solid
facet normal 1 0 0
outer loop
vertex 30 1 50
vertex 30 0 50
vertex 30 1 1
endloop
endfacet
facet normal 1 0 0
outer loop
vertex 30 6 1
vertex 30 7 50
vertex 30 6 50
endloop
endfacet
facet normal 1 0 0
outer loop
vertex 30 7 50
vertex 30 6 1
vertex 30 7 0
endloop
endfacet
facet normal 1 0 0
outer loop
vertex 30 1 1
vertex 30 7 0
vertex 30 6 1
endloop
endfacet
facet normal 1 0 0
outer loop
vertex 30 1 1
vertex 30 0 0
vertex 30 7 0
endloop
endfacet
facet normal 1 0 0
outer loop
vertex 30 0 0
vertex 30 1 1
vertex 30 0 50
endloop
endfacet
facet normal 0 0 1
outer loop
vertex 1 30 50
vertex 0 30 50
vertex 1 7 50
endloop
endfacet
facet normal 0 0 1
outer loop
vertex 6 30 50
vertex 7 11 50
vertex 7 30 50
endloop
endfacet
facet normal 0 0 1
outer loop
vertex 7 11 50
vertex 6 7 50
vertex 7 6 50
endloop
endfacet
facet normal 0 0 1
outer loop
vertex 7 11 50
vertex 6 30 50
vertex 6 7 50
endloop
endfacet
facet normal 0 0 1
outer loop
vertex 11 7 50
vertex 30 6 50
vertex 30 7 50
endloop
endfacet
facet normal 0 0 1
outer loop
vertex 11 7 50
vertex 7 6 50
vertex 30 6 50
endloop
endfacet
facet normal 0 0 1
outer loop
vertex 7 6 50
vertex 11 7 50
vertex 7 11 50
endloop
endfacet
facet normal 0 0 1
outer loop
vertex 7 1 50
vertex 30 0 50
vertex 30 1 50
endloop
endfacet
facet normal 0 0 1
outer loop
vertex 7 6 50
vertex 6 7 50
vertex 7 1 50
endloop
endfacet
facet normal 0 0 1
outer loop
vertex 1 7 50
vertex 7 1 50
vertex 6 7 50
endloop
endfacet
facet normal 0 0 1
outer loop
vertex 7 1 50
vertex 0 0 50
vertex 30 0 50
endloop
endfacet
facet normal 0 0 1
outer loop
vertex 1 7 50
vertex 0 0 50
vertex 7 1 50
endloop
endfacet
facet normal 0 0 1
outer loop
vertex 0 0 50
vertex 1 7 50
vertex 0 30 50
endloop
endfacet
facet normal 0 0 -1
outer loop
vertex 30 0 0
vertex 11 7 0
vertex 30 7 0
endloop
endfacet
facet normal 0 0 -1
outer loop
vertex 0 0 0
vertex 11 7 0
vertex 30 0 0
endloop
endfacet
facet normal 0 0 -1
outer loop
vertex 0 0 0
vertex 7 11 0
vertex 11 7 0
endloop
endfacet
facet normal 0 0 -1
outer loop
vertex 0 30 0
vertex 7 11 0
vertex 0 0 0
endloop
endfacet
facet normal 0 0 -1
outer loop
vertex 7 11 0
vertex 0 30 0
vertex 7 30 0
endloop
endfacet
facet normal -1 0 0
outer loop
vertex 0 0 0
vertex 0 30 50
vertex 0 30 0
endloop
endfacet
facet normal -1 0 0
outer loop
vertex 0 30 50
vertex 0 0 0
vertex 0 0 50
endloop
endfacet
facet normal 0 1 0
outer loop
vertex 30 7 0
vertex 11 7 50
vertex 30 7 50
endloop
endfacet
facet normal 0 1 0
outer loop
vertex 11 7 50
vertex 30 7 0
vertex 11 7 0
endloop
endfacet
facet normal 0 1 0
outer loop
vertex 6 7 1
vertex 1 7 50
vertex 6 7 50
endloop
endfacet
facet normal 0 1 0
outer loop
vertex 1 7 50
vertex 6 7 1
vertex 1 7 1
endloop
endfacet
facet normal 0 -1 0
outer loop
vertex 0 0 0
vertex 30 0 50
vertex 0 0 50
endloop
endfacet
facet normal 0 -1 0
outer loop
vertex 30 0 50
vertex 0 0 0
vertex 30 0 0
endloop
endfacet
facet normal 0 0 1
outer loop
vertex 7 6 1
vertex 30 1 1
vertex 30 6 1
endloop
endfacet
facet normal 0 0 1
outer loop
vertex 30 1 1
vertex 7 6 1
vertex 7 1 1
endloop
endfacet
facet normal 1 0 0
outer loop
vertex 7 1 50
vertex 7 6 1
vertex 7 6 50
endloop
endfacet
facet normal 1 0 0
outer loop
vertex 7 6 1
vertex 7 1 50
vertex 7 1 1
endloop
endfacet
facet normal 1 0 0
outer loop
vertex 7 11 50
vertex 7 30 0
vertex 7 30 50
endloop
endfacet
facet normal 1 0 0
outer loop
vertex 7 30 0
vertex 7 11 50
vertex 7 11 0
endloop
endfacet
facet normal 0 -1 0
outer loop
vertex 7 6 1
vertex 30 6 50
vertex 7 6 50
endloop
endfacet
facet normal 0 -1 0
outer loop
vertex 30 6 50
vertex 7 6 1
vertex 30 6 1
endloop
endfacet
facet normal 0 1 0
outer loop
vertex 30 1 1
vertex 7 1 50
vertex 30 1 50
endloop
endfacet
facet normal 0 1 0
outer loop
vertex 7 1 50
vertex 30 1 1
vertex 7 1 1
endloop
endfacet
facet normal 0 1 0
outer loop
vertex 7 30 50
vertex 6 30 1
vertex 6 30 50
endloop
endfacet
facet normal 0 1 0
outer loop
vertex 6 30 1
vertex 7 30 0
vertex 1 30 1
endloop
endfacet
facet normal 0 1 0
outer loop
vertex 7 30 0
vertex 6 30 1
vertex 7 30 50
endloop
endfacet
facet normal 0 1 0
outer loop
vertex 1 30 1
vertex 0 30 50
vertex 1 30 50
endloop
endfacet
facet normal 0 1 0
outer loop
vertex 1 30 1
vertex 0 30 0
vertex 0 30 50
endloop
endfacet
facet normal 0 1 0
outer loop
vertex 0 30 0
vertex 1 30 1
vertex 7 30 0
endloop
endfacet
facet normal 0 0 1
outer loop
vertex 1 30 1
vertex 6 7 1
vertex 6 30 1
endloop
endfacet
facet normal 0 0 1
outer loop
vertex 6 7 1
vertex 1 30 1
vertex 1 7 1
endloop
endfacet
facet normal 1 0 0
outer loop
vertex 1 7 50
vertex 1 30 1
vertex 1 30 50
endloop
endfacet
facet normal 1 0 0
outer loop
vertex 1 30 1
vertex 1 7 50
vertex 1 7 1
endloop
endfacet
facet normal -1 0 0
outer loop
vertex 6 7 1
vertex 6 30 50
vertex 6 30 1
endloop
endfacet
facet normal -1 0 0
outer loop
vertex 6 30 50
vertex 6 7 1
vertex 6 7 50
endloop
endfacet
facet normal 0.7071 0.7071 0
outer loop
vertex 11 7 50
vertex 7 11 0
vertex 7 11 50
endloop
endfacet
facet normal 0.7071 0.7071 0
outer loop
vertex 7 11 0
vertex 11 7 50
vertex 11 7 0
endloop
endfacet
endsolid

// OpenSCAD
  difference() {
    cube([30,5+2,50]);
    translate([5+2,1,1]) cube([50,5,50]);
  }


color("red")
translate([5+2,0,0])
rotate([0,0,90])
    difference() {
      cube([30,5+2,50]);
      translate([5+2,1,1]) cube([50,5,50]);
    }

translate([7,7,0])
linear_extrude(height=50)
polygon(points=[[0,0],[4,0],[0,4]]);
